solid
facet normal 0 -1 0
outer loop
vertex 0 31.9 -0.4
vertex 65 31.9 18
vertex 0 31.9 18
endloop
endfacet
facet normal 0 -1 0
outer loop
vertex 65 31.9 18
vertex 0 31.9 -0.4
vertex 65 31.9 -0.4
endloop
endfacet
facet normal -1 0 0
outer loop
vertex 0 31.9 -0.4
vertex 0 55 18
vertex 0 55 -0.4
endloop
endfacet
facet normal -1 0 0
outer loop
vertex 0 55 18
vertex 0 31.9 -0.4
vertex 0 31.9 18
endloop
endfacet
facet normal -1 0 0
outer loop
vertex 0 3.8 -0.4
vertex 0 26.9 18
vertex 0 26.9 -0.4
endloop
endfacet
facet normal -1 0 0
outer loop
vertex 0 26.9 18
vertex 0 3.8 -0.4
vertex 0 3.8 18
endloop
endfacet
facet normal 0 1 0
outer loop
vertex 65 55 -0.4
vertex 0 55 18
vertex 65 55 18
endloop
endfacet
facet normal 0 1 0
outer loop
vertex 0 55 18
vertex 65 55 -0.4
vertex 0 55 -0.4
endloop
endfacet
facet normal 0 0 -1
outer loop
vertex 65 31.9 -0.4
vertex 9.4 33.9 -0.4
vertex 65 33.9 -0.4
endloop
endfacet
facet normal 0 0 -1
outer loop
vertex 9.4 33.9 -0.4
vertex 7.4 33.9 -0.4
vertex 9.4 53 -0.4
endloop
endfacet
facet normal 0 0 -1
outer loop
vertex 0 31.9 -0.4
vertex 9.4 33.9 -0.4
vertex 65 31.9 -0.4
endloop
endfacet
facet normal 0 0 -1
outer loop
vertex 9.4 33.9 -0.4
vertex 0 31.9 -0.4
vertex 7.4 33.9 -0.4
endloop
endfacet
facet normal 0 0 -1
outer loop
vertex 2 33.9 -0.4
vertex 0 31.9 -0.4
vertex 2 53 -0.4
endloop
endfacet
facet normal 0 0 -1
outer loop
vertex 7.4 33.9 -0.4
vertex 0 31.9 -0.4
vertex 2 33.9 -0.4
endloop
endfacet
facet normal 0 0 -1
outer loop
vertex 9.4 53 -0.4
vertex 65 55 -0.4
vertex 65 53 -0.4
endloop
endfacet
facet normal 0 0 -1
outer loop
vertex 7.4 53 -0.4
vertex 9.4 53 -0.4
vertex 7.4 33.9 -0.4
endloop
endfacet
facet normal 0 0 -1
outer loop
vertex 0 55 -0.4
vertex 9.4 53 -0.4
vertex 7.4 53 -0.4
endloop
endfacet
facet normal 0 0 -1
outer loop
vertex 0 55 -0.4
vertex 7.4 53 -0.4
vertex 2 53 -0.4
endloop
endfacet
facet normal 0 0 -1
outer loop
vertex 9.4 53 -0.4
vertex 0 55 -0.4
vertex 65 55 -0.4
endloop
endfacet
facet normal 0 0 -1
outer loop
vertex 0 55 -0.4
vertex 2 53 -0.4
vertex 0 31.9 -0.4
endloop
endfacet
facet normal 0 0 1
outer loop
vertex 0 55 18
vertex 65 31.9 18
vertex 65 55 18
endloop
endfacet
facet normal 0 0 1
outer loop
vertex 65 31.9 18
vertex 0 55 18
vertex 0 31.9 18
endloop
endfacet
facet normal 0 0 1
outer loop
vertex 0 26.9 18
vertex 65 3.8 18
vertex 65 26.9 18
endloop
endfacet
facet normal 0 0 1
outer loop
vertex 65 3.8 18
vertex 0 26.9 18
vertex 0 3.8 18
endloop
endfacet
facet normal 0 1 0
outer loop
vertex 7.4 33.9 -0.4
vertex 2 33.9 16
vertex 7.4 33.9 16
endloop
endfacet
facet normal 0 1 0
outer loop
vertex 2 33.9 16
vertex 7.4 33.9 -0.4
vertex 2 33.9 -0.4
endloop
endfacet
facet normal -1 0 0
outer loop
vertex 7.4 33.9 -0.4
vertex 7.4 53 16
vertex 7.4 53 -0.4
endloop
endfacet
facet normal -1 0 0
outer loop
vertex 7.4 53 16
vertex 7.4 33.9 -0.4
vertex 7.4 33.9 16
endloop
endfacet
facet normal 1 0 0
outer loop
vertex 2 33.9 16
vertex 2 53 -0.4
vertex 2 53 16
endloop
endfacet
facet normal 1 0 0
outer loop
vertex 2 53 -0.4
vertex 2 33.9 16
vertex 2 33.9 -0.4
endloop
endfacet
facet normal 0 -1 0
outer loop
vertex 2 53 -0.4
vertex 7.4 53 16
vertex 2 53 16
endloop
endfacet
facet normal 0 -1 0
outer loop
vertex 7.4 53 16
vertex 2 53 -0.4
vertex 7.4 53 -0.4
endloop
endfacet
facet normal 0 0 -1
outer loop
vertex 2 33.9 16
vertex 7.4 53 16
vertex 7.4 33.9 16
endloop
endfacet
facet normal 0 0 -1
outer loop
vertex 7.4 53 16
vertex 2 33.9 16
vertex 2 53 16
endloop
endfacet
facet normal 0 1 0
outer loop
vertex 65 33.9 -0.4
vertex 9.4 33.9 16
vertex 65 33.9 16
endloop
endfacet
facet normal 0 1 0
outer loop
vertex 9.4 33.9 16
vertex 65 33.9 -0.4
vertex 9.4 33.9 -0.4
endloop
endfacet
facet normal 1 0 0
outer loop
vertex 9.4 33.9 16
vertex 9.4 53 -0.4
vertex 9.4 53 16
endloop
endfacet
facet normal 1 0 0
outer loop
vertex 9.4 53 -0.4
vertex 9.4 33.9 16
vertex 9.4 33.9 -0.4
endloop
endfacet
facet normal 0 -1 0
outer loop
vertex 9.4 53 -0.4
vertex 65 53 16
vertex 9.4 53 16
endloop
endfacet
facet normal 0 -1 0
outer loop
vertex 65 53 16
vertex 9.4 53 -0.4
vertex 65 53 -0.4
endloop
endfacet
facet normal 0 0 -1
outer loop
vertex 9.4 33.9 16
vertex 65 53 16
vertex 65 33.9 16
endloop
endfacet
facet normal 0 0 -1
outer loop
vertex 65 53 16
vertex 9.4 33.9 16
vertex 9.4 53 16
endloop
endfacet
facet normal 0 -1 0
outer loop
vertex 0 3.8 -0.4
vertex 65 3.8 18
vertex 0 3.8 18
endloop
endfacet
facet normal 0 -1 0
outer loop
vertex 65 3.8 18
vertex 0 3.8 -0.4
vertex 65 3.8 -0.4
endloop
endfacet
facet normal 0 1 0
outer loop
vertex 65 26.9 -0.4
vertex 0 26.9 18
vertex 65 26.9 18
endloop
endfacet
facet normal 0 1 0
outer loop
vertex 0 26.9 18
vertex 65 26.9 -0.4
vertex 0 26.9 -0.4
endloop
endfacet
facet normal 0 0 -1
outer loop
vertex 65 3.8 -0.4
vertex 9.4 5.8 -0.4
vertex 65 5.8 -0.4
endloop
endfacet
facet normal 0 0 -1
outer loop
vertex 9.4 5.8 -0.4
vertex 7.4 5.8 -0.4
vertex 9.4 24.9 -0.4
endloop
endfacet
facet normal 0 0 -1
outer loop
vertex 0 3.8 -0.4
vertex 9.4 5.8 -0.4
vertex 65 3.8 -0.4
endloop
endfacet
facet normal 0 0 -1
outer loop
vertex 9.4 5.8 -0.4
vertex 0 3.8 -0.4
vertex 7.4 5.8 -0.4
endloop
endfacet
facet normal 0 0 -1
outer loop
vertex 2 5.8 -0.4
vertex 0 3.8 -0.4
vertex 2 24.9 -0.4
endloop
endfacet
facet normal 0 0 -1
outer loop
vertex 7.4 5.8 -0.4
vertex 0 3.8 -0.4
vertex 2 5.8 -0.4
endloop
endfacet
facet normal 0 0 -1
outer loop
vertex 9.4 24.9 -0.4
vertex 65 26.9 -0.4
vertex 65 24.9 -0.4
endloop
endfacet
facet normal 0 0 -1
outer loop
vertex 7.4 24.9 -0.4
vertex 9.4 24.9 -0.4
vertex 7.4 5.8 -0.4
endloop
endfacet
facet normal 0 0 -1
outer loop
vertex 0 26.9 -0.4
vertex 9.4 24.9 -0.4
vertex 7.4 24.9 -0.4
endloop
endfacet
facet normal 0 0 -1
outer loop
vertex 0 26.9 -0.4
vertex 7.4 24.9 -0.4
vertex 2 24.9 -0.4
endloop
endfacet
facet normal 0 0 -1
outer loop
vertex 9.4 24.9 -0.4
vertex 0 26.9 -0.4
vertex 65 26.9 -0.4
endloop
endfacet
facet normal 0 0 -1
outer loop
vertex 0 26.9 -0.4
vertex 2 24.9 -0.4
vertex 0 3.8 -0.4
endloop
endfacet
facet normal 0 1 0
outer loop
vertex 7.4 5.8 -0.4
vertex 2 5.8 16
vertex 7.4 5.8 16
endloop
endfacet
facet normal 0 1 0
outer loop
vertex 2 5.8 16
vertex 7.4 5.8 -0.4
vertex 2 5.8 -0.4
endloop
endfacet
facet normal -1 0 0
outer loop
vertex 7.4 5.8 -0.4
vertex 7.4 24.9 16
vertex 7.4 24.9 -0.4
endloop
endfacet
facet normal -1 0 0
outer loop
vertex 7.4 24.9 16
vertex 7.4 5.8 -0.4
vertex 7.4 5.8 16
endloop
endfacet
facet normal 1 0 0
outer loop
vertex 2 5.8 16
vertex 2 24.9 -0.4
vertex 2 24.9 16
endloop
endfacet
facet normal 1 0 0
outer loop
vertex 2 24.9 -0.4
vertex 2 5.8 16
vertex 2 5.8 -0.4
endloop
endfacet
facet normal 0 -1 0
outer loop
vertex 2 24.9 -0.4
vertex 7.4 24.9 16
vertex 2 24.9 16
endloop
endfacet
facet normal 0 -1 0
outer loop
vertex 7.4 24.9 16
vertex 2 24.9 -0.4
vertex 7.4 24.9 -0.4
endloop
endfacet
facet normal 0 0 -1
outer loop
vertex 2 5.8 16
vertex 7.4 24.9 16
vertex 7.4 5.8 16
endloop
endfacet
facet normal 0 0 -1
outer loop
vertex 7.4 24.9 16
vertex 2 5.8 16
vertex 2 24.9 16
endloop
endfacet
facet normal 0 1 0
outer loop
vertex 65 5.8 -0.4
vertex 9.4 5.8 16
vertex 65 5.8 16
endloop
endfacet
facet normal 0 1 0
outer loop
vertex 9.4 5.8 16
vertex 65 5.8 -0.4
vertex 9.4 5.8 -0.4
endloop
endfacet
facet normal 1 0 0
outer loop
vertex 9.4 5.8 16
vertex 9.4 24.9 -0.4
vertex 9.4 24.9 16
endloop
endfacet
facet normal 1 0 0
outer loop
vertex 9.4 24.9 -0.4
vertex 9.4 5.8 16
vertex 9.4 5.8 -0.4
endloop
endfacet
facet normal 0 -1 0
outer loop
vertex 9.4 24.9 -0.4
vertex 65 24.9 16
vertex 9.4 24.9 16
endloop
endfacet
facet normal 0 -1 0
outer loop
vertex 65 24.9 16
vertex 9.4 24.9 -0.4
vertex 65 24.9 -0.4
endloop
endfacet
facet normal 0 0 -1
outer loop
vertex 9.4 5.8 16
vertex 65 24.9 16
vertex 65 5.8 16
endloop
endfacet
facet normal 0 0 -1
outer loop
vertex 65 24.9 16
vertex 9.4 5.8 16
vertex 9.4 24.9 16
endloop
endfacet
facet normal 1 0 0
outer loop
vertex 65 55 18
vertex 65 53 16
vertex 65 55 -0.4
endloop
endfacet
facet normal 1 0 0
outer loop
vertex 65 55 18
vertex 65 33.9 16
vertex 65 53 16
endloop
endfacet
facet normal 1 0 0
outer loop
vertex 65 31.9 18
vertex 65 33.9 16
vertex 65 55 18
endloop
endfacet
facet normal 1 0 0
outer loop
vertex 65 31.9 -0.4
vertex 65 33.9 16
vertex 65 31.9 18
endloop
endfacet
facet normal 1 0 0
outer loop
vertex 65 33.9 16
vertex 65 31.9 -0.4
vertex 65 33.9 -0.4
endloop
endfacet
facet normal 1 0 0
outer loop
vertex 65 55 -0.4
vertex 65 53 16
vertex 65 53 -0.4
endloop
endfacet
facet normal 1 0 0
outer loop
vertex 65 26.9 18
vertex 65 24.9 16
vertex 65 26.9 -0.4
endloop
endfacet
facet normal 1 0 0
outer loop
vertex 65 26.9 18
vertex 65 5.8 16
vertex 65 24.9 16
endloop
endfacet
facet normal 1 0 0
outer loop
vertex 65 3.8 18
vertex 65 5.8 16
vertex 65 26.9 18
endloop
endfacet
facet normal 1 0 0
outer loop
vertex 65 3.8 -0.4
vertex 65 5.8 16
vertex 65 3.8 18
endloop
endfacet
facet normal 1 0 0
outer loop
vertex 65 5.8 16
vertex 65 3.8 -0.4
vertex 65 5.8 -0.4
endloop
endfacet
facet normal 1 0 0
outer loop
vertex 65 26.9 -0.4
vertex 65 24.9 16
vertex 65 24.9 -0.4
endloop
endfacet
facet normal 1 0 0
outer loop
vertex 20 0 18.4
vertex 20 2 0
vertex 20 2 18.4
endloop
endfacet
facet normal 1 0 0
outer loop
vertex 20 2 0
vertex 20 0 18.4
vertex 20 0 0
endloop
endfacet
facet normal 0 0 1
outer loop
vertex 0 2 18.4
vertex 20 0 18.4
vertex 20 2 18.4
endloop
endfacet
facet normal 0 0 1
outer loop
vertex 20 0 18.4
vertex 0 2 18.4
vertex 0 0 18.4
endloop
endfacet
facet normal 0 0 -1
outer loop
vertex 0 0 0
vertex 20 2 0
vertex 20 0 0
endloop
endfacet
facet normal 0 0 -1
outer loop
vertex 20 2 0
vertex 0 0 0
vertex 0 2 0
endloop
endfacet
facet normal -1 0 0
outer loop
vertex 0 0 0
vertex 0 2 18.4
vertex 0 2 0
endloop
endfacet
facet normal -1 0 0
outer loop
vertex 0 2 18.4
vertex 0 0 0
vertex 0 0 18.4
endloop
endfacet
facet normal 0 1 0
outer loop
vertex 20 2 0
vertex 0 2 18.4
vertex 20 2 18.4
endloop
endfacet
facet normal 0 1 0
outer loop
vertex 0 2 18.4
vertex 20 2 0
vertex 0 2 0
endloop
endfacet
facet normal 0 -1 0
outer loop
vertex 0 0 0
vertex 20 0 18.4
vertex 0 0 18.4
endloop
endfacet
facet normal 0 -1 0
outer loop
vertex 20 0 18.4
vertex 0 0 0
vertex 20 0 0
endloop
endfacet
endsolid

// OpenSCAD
/**
 * PARAMETRIC TABLETOP SPOOL HOLDER
 * 
 * @author	Pacien TRAN-GIRARD
 * @version	1.1
 * @license	CC BY-NC-SA 3.0
 */

module spool() { 
translate([0, 88, 115])
rotate([90, 0, 0])
difference() {
cylinder(h = 60, r = 99, center = false);
translate([0, 0, -.01])
cylinder(h = 70, r = 27, center = false);
}
}
// spool();

/***** PARAMETERS *****/

material_thickness = 2;
material_space = 0.35;
material_eco = true;

rod_length = 105;
rod_radius = 9.2;

pillar_height = 130;

base_height = 25;
base_length = 105;


/***** TO PRINT *****/
//preview_all();

module base_rods() {
    intersection() {
        translate([0, 52, 0])
        cube([140, 160, 50]);
        print_all();
    }
}
//base_rods();

module pillars() {
    module unsliced() {
        intersection() {
           cube([140, 55, 60]);
           print_all();
        }
    }
    module left() {
        intersection() {
            unsliced();
            cube([pillar_height/2, base_height*2+10, base_height]);
        }
    }
    module right() {
        intersection() {
            unsliced();
            translate([pillar_height/2, 0, 0])
                cube([pillar_height/2, base_height*2+10, base_height]);
        }
    }
    translate([0, pillar_height/2-10, 18])
    rotate([180,0,0])
    left();
    
    //translate([-pillar_height/2, base_height*2+5, 0])
       // right();
}

cut_pillar_depth = 2*rod_radius+2*(material_thickness+material_space);
cut_pillar_height = 2*rod_radius;

module joiner() {

    cube([20,2, cut_pillar_height]);


}

joiner();

pillars();



// print_base();
// print_coupler();
// print_rod();
// print_pillar();



/********** This is where it gets complicated **********/



/***** MODELS *****/


module print_all() {
	
	space=5;

		print_pillar();

		translate([0, 2*rod_radius+2*(material_thickness+material_space)+space, 0]) {

			print_pillar();

			translate([0, 2*rod_radius+2*(material_thickness+material_space)+space, 0]) {

				print_base();

				translate([0, 2*rod_radius+2*(material_thickness+material_space)+space, 0]) {

					print_base();

					translate([0, 2*rod_radius+2*(material_thickness+material_space)+space, 0]) {

						print_rod();

						translate([0, rod_radius*2+space, 0]) {

							print_coupler();

						}
					}
				}
			}
		}

}

module preview_all() {

	translate([	-(rod_radius+material_thickness+material_space),
					material_thickness+material_space,
					material_thickness+material_space]) {

		sized_pillar();

		translate([0, rod_length+2*(material_thickness+material_space), 0]) {
			mirror([0, 1, 0]) {
				sized_pillar();
			}
		}

		translate([	rod_radius+material_thickness+material_space,
						material_thickness+material_space,
						pillar_height]) {
			rotate([0, 0, 90]) {
				sized_rod();
			}
		}
	
	}
	
	sized_base();

	translate([0, rod_length+4*(material_thickness+material_space), 0]) {
		mirror([0, 1, 0]) {
			sized_base();
		}
	}

	translate([-rod_radius, 2*(material_thickness+material_space), 0]) {
		sized_coupler();
	}

}


/***** MODULE TRANSLATING *****/

module print_base() {
	translate([base_length/2, 0, 0]) {
		sized_base();
	}
}

module print_coupler() {
	translate([rod_length, 0, 4*(material_thickness+material_space)]) {
		rotate([0, 0, 90]) {
			mirror([0, 0, 1]) {
				sized_coupler();
			}
		}
	}
}

module print_rod() {
	translate([0, rod_radius, rod_radius]) {
		sized_rod();
	}
}

module print_pillar() {
	rotate([90, 0, 90]) {
		sized_pillar();
	}
}


/***** MODULE SIZING *****/

module sized_base() {
	base(	base_length,
				2*rod_radius+2*(material_thickness+material_space),
				base_height,
				material_thickness,
				material_space,
				material_eco
	);
}

module sized_coupler() {
	coupler(rod_length, 2*rod_radius, material_thickness, material_space, material_eco);
}

module sized_rod() {
	rod(rod_length, rod_radius);
}

module sized_pillar() {
	pillar(	2*rod_radius+2*(material_thickness+material_space),
				2*rod_radius,
				pillar_height,
				material_thickness,
				rod_radius+material_space,
				material_eco);
}


/***** MODULES *****/

module base(length, width, height, material_thickness, material_space, material_eco) {
	
	half_base(length/2, width, height, material_thickness, material_space, material_eco);
	
	mirror([1, 0, 0]) {
		half_base(length/2, width, height, material_thickness, material_space, material_eco);
	}
	
}

module half_base(length, width, height, material_thickness, material_space, material_eco) {
	
	difference() {
		
		prism(width, length, height);
		
		translate([0, material_thickness, material_thickness]) {
			cube([width/8+material_space, width, height]);
			
			cube([width/2+material_space, width-2*material_thickness, height]);

			if (material_eco == true) {
				translate([width/2+material_thickness+material_space, 0, 0]) {
					cube([length, width-2*material_thickness, height]);
				}
			}

		}

	}
	
}

module pillar(length, width, height, material_thickness, rod_slot, material_eco) {
	
	coupler_slot_height = 2*(material_thickness+material_space)+2*material_space;
	length_inside = length-2*material_thickness;
	width_inside = width-material_thickness;

	difference() {
		
		cube([length, width, height]);

		translate([material_thickness, material_thickness, material_thickness]) {
			cube([length_inside, width_inside, coupler_slot_height]);
		}
		
		translate([material_thickness, material_thickness, height-rod_slot]) {
			cube([length_inside, width_inside, rod_slot]);
		}
		
		if (material_eco == true) {
			translate([material_thickness, material_thickness, coupler_slot_height+2*material_thickness]) {
				cube([length_inside, width_inside, height-coupler_slot_height-(3*material_thickness+rod_slot)]);
			}
		}
		
	}
	
}

module coupler(length, width, material_thickness, material_space, material_eco) {

	half_coupler(length/2, width, material_thickness, material_space, material_eco);

	translate([0, length, 0]) {
		mirror([0, 1, 0]) {
			half_coupler(length/2, width, material_thickness, material_space, material_eco);
		}
	}

}

module half_coupler(length, width, material_thickness, material_space, material_eco) {

	height = 4*(material_thickness+material_space);
	width_inside = width-2*material_thickness;

	difference() {

		cube([width, length, height]);

		cube([width, width-material_thickness, 2*(material_thickness+material_space)]);

		translate([0, width-(material_thickness+material_space), 0]) {

			cube([width, material_thickness+2*material_space, material_thickness+material_space]);

			cube([width/2-(width/8+material_space), material_thickness+2*material_space, height]);

			translate([width/2+(width/8+material_space), 0, 0]) {
				cube([width/2-(width/8+material_space), material_thickness+2*material_space, height]);
			}
				
		}

		if (material_eco == true) {

			translate([material_thickness, material_thickness, 0]) {
				cube([width_inside, width-(3*material_thickness+material_space), height-material_thickness]);
			}
		
			translate([material_thickness, width+material_thickness+material_space, 0]) {
				cube([width_inside, length-(width+material_thickness+material_space), height-material_thickness]);
			}
		
		}
		
	}
}

module rod(length, radius) {
	
	rotate([0, 90, 0]) {
		cylinder(h=length, r=radius, $fn=5*radius);
	}
	
	translate([0, -radius, -radius]) {
		cube([length, 2*radius, radius]);
	}

}


/***** THIRD PARTY *****/

//https://github.com/dannystaple/OpenSCAD-Parts-Library/blob/master/prism.scad
//Draw a prism based on a 
//right angled triangle
//l - length of prism
//w - width of triangle
//h - height of triangle
module prism(l, w, h) {
	translate([0, l, 0]) rotate( a= [90, 0, 0]) 
	linear_extrude(height = l) polygon(points = [
		[0, 0],
		[w, 0],
		[0, h]
	], paths=[[0,1,2,0]]);
}
